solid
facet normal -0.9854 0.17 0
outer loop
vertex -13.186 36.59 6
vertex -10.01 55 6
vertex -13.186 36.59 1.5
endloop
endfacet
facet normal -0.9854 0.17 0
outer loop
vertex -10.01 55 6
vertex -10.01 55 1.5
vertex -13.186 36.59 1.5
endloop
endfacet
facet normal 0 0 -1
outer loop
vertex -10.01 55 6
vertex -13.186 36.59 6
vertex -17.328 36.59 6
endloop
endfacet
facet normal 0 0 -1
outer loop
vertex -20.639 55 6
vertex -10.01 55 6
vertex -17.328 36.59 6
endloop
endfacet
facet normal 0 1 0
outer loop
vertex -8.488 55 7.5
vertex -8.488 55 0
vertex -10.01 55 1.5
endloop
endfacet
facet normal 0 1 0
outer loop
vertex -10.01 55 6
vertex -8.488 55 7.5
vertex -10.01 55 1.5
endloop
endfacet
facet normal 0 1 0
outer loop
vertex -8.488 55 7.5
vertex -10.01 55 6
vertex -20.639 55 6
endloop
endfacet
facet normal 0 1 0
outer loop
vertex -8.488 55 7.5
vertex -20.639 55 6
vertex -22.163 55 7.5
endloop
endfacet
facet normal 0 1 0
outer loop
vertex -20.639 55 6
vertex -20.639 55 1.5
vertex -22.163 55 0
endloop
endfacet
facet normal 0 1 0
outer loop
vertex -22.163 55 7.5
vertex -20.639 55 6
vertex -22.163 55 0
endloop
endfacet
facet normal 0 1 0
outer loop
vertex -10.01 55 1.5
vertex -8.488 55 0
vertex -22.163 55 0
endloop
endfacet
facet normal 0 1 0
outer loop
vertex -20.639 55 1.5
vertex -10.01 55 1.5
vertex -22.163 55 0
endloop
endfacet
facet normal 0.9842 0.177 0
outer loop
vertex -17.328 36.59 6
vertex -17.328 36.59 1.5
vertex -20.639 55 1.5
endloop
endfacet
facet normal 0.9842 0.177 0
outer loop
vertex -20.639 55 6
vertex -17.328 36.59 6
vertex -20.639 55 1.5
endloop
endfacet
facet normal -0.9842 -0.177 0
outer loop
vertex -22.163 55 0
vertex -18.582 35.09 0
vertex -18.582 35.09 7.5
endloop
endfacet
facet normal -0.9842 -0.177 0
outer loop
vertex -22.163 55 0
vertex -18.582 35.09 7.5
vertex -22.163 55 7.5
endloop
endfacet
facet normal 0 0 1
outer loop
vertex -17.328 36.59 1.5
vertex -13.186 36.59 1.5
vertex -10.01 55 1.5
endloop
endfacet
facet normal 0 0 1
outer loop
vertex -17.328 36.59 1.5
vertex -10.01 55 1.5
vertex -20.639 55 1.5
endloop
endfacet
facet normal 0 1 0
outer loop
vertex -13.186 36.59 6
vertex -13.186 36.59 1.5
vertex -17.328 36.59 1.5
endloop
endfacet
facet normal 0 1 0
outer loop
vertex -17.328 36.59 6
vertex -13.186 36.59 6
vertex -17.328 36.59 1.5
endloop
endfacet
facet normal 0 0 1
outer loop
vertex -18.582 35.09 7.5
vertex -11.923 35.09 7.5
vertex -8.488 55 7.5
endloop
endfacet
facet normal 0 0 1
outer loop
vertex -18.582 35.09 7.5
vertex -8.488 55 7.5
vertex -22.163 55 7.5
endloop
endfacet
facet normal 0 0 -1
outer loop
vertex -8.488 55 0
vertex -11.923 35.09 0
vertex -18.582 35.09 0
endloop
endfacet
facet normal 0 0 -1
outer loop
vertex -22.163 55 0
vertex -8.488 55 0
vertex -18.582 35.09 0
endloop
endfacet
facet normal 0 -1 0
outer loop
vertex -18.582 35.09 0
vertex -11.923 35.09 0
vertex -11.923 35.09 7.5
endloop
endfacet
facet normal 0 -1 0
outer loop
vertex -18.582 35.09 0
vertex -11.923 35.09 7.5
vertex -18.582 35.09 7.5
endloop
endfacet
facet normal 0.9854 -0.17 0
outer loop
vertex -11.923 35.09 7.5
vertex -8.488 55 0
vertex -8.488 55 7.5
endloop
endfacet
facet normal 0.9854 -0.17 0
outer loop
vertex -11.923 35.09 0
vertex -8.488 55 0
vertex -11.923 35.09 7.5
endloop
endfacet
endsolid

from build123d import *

# Parameters (mm, degrees)
EXTRUDE_1_DEPTH = 7.5
SHELL_1_T       = -1.5


with BuildPart() as part:
    # 草图1 → 凸台-拉伸1 (new body)
    with BuildSketch(Plane.XY):
        Polygon((-22.163477656, 55), (-15.358999723, 55), (-8.487673684, 55), (-11.922964888, 35.089989422), (-18.582368801, 35.089989422), align=None)
    extrude(amount=EXTRUDE_1_DEPTH)

    # 抽壳1
    shell_1_openings = [part.faces().sort_by_distance(p)[0] for p in [
        (-15.32557567, 55, 3.75),
    ]]
    offset(amount=SHELL_1_T, openings=shell_1_openings, kind=Kind.INTERSECTION)


solid = part.part
